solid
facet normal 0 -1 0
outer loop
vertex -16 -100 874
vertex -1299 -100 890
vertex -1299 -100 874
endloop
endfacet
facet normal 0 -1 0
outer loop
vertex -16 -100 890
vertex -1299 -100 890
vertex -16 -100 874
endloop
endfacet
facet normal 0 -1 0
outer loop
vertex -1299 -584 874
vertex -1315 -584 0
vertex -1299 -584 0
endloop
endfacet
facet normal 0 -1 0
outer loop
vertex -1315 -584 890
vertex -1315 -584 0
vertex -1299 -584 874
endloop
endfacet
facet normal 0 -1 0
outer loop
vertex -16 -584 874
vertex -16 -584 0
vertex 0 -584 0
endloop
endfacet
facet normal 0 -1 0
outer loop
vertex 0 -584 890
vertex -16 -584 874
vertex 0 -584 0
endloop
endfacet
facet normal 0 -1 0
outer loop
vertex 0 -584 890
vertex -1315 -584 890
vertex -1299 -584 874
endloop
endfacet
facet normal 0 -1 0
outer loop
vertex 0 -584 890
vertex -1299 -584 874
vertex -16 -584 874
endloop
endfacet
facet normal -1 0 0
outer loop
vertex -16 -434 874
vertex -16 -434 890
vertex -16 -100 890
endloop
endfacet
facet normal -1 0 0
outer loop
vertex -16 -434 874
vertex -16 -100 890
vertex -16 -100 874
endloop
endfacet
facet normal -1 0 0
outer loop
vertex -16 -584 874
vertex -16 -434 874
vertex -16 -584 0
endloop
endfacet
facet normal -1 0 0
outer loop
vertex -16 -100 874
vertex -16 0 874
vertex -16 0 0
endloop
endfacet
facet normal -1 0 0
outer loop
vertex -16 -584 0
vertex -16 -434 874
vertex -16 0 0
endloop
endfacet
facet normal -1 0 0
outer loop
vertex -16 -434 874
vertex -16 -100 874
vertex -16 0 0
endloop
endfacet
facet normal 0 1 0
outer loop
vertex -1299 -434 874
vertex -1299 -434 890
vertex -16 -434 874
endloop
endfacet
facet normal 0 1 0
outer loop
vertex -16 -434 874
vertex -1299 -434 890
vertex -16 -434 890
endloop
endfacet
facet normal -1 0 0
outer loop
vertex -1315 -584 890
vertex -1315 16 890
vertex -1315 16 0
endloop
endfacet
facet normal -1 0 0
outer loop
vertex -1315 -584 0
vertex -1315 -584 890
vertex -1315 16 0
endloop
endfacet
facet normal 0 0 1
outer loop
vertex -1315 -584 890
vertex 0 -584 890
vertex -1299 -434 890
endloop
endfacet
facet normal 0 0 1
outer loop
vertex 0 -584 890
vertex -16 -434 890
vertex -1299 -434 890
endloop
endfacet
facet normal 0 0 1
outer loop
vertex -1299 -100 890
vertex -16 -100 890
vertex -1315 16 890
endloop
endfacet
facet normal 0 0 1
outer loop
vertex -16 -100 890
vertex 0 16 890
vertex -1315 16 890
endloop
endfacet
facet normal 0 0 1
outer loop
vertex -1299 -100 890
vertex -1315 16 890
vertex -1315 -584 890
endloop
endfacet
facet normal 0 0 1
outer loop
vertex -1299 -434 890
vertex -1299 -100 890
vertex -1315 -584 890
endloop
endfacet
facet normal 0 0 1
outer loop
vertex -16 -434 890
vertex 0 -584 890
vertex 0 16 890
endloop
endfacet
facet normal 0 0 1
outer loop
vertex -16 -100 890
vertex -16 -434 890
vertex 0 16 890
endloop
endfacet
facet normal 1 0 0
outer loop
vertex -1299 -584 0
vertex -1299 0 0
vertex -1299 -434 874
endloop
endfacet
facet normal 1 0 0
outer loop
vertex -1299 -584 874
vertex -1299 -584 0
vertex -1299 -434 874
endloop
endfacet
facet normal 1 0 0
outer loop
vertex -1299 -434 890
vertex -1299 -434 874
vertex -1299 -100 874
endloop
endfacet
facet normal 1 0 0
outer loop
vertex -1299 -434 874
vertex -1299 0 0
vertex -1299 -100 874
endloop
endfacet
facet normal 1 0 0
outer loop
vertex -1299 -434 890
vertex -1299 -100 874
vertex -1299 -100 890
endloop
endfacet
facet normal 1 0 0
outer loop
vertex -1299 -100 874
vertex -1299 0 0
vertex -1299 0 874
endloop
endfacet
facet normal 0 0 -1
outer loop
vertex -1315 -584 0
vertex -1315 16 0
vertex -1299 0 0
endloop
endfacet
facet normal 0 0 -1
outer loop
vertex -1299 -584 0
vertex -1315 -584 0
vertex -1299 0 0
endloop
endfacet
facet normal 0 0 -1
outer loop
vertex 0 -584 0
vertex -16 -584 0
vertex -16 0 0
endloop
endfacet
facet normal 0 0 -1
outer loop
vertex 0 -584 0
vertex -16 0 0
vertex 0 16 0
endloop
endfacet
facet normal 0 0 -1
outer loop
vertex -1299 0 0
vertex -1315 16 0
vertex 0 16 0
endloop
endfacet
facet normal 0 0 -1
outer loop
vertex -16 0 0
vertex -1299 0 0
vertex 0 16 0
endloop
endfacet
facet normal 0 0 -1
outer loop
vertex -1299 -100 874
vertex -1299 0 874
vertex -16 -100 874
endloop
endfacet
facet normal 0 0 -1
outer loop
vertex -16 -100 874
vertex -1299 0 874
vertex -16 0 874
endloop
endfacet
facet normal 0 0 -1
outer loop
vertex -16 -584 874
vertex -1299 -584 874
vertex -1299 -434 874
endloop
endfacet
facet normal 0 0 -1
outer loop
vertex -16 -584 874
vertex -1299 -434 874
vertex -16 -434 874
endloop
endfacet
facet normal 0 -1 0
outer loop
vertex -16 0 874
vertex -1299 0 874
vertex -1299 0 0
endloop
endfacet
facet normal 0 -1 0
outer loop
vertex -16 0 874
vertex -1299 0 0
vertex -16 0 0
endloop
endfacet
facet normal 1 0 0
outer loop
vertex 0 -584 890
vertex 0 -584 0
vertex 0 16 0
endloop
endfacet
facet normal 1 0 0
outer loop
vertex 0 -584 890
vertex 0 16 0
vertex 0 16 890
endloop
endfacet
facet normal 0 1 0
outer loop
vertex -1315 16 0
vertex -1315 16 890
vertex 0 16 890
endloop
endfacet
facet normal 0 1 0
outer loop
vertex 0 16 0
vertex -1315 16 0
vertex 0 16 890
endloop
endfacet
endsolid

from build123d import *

# Parameters (mm, degrees)
F0_W     = 1283
F0_H     = 874
F0_H_2   = 16
F1_DEPTH = 16
F2_DEPTH = 584
F3_DEPTH = 100
F4_W     = 1283
F4_H     = 16
F5_DEPTH = 150


with BuildPart() as f1:
    # F0 (on Front) → F1 (new body)
    with BuildSketch(Plane.XZ):
        with Locations((-657.5, 437)):
            Rectangle(F0_W, F0_H)
        with Locations((-657.5, 882)):
            Rectangle(F0_W, F0_H_2)
        Polygon((-16, 0), (0, 0), (0, 890), (-16, 890), (-16, 874), align=None)
        Polygon((-1315, 0), (-1299, 0), (-1299, 874), (-1299, 890), (-1315, 890), align=None)
    extrude(amount=-F1_DEPTH)

    # F0 (on Front) → F2 (join)
    with BuildSketch(Plane.XZ):
        Polygon((-1315, 0), (-1299, 0), (-1299, 874), (-1299, 890), (-1315, 890), align=None)
        Polygon((-16, 0), (0, 0), (0, 890), (-16, 890), (-16, 874), align=None)
    extrude(amount=F2_DEPTH)

    # F0 (on Front) → F3 (join)
    with BuildSketch(Plane.XZ):
        with Locations((-657.5, 882)):
            Rectangle(F0_W, F0_H_2)
    extrude(amount=F3_DEPTH)

    # F4 (on face) → F5 (join)
    with BuildSketch(Plane.XZ.offset(584)):
        with Locations((-657.5, 882)):
            Rectangle(F4_W, F4_H)
    extrude(amount=-F5_DEPTH)


solid = f1.part
